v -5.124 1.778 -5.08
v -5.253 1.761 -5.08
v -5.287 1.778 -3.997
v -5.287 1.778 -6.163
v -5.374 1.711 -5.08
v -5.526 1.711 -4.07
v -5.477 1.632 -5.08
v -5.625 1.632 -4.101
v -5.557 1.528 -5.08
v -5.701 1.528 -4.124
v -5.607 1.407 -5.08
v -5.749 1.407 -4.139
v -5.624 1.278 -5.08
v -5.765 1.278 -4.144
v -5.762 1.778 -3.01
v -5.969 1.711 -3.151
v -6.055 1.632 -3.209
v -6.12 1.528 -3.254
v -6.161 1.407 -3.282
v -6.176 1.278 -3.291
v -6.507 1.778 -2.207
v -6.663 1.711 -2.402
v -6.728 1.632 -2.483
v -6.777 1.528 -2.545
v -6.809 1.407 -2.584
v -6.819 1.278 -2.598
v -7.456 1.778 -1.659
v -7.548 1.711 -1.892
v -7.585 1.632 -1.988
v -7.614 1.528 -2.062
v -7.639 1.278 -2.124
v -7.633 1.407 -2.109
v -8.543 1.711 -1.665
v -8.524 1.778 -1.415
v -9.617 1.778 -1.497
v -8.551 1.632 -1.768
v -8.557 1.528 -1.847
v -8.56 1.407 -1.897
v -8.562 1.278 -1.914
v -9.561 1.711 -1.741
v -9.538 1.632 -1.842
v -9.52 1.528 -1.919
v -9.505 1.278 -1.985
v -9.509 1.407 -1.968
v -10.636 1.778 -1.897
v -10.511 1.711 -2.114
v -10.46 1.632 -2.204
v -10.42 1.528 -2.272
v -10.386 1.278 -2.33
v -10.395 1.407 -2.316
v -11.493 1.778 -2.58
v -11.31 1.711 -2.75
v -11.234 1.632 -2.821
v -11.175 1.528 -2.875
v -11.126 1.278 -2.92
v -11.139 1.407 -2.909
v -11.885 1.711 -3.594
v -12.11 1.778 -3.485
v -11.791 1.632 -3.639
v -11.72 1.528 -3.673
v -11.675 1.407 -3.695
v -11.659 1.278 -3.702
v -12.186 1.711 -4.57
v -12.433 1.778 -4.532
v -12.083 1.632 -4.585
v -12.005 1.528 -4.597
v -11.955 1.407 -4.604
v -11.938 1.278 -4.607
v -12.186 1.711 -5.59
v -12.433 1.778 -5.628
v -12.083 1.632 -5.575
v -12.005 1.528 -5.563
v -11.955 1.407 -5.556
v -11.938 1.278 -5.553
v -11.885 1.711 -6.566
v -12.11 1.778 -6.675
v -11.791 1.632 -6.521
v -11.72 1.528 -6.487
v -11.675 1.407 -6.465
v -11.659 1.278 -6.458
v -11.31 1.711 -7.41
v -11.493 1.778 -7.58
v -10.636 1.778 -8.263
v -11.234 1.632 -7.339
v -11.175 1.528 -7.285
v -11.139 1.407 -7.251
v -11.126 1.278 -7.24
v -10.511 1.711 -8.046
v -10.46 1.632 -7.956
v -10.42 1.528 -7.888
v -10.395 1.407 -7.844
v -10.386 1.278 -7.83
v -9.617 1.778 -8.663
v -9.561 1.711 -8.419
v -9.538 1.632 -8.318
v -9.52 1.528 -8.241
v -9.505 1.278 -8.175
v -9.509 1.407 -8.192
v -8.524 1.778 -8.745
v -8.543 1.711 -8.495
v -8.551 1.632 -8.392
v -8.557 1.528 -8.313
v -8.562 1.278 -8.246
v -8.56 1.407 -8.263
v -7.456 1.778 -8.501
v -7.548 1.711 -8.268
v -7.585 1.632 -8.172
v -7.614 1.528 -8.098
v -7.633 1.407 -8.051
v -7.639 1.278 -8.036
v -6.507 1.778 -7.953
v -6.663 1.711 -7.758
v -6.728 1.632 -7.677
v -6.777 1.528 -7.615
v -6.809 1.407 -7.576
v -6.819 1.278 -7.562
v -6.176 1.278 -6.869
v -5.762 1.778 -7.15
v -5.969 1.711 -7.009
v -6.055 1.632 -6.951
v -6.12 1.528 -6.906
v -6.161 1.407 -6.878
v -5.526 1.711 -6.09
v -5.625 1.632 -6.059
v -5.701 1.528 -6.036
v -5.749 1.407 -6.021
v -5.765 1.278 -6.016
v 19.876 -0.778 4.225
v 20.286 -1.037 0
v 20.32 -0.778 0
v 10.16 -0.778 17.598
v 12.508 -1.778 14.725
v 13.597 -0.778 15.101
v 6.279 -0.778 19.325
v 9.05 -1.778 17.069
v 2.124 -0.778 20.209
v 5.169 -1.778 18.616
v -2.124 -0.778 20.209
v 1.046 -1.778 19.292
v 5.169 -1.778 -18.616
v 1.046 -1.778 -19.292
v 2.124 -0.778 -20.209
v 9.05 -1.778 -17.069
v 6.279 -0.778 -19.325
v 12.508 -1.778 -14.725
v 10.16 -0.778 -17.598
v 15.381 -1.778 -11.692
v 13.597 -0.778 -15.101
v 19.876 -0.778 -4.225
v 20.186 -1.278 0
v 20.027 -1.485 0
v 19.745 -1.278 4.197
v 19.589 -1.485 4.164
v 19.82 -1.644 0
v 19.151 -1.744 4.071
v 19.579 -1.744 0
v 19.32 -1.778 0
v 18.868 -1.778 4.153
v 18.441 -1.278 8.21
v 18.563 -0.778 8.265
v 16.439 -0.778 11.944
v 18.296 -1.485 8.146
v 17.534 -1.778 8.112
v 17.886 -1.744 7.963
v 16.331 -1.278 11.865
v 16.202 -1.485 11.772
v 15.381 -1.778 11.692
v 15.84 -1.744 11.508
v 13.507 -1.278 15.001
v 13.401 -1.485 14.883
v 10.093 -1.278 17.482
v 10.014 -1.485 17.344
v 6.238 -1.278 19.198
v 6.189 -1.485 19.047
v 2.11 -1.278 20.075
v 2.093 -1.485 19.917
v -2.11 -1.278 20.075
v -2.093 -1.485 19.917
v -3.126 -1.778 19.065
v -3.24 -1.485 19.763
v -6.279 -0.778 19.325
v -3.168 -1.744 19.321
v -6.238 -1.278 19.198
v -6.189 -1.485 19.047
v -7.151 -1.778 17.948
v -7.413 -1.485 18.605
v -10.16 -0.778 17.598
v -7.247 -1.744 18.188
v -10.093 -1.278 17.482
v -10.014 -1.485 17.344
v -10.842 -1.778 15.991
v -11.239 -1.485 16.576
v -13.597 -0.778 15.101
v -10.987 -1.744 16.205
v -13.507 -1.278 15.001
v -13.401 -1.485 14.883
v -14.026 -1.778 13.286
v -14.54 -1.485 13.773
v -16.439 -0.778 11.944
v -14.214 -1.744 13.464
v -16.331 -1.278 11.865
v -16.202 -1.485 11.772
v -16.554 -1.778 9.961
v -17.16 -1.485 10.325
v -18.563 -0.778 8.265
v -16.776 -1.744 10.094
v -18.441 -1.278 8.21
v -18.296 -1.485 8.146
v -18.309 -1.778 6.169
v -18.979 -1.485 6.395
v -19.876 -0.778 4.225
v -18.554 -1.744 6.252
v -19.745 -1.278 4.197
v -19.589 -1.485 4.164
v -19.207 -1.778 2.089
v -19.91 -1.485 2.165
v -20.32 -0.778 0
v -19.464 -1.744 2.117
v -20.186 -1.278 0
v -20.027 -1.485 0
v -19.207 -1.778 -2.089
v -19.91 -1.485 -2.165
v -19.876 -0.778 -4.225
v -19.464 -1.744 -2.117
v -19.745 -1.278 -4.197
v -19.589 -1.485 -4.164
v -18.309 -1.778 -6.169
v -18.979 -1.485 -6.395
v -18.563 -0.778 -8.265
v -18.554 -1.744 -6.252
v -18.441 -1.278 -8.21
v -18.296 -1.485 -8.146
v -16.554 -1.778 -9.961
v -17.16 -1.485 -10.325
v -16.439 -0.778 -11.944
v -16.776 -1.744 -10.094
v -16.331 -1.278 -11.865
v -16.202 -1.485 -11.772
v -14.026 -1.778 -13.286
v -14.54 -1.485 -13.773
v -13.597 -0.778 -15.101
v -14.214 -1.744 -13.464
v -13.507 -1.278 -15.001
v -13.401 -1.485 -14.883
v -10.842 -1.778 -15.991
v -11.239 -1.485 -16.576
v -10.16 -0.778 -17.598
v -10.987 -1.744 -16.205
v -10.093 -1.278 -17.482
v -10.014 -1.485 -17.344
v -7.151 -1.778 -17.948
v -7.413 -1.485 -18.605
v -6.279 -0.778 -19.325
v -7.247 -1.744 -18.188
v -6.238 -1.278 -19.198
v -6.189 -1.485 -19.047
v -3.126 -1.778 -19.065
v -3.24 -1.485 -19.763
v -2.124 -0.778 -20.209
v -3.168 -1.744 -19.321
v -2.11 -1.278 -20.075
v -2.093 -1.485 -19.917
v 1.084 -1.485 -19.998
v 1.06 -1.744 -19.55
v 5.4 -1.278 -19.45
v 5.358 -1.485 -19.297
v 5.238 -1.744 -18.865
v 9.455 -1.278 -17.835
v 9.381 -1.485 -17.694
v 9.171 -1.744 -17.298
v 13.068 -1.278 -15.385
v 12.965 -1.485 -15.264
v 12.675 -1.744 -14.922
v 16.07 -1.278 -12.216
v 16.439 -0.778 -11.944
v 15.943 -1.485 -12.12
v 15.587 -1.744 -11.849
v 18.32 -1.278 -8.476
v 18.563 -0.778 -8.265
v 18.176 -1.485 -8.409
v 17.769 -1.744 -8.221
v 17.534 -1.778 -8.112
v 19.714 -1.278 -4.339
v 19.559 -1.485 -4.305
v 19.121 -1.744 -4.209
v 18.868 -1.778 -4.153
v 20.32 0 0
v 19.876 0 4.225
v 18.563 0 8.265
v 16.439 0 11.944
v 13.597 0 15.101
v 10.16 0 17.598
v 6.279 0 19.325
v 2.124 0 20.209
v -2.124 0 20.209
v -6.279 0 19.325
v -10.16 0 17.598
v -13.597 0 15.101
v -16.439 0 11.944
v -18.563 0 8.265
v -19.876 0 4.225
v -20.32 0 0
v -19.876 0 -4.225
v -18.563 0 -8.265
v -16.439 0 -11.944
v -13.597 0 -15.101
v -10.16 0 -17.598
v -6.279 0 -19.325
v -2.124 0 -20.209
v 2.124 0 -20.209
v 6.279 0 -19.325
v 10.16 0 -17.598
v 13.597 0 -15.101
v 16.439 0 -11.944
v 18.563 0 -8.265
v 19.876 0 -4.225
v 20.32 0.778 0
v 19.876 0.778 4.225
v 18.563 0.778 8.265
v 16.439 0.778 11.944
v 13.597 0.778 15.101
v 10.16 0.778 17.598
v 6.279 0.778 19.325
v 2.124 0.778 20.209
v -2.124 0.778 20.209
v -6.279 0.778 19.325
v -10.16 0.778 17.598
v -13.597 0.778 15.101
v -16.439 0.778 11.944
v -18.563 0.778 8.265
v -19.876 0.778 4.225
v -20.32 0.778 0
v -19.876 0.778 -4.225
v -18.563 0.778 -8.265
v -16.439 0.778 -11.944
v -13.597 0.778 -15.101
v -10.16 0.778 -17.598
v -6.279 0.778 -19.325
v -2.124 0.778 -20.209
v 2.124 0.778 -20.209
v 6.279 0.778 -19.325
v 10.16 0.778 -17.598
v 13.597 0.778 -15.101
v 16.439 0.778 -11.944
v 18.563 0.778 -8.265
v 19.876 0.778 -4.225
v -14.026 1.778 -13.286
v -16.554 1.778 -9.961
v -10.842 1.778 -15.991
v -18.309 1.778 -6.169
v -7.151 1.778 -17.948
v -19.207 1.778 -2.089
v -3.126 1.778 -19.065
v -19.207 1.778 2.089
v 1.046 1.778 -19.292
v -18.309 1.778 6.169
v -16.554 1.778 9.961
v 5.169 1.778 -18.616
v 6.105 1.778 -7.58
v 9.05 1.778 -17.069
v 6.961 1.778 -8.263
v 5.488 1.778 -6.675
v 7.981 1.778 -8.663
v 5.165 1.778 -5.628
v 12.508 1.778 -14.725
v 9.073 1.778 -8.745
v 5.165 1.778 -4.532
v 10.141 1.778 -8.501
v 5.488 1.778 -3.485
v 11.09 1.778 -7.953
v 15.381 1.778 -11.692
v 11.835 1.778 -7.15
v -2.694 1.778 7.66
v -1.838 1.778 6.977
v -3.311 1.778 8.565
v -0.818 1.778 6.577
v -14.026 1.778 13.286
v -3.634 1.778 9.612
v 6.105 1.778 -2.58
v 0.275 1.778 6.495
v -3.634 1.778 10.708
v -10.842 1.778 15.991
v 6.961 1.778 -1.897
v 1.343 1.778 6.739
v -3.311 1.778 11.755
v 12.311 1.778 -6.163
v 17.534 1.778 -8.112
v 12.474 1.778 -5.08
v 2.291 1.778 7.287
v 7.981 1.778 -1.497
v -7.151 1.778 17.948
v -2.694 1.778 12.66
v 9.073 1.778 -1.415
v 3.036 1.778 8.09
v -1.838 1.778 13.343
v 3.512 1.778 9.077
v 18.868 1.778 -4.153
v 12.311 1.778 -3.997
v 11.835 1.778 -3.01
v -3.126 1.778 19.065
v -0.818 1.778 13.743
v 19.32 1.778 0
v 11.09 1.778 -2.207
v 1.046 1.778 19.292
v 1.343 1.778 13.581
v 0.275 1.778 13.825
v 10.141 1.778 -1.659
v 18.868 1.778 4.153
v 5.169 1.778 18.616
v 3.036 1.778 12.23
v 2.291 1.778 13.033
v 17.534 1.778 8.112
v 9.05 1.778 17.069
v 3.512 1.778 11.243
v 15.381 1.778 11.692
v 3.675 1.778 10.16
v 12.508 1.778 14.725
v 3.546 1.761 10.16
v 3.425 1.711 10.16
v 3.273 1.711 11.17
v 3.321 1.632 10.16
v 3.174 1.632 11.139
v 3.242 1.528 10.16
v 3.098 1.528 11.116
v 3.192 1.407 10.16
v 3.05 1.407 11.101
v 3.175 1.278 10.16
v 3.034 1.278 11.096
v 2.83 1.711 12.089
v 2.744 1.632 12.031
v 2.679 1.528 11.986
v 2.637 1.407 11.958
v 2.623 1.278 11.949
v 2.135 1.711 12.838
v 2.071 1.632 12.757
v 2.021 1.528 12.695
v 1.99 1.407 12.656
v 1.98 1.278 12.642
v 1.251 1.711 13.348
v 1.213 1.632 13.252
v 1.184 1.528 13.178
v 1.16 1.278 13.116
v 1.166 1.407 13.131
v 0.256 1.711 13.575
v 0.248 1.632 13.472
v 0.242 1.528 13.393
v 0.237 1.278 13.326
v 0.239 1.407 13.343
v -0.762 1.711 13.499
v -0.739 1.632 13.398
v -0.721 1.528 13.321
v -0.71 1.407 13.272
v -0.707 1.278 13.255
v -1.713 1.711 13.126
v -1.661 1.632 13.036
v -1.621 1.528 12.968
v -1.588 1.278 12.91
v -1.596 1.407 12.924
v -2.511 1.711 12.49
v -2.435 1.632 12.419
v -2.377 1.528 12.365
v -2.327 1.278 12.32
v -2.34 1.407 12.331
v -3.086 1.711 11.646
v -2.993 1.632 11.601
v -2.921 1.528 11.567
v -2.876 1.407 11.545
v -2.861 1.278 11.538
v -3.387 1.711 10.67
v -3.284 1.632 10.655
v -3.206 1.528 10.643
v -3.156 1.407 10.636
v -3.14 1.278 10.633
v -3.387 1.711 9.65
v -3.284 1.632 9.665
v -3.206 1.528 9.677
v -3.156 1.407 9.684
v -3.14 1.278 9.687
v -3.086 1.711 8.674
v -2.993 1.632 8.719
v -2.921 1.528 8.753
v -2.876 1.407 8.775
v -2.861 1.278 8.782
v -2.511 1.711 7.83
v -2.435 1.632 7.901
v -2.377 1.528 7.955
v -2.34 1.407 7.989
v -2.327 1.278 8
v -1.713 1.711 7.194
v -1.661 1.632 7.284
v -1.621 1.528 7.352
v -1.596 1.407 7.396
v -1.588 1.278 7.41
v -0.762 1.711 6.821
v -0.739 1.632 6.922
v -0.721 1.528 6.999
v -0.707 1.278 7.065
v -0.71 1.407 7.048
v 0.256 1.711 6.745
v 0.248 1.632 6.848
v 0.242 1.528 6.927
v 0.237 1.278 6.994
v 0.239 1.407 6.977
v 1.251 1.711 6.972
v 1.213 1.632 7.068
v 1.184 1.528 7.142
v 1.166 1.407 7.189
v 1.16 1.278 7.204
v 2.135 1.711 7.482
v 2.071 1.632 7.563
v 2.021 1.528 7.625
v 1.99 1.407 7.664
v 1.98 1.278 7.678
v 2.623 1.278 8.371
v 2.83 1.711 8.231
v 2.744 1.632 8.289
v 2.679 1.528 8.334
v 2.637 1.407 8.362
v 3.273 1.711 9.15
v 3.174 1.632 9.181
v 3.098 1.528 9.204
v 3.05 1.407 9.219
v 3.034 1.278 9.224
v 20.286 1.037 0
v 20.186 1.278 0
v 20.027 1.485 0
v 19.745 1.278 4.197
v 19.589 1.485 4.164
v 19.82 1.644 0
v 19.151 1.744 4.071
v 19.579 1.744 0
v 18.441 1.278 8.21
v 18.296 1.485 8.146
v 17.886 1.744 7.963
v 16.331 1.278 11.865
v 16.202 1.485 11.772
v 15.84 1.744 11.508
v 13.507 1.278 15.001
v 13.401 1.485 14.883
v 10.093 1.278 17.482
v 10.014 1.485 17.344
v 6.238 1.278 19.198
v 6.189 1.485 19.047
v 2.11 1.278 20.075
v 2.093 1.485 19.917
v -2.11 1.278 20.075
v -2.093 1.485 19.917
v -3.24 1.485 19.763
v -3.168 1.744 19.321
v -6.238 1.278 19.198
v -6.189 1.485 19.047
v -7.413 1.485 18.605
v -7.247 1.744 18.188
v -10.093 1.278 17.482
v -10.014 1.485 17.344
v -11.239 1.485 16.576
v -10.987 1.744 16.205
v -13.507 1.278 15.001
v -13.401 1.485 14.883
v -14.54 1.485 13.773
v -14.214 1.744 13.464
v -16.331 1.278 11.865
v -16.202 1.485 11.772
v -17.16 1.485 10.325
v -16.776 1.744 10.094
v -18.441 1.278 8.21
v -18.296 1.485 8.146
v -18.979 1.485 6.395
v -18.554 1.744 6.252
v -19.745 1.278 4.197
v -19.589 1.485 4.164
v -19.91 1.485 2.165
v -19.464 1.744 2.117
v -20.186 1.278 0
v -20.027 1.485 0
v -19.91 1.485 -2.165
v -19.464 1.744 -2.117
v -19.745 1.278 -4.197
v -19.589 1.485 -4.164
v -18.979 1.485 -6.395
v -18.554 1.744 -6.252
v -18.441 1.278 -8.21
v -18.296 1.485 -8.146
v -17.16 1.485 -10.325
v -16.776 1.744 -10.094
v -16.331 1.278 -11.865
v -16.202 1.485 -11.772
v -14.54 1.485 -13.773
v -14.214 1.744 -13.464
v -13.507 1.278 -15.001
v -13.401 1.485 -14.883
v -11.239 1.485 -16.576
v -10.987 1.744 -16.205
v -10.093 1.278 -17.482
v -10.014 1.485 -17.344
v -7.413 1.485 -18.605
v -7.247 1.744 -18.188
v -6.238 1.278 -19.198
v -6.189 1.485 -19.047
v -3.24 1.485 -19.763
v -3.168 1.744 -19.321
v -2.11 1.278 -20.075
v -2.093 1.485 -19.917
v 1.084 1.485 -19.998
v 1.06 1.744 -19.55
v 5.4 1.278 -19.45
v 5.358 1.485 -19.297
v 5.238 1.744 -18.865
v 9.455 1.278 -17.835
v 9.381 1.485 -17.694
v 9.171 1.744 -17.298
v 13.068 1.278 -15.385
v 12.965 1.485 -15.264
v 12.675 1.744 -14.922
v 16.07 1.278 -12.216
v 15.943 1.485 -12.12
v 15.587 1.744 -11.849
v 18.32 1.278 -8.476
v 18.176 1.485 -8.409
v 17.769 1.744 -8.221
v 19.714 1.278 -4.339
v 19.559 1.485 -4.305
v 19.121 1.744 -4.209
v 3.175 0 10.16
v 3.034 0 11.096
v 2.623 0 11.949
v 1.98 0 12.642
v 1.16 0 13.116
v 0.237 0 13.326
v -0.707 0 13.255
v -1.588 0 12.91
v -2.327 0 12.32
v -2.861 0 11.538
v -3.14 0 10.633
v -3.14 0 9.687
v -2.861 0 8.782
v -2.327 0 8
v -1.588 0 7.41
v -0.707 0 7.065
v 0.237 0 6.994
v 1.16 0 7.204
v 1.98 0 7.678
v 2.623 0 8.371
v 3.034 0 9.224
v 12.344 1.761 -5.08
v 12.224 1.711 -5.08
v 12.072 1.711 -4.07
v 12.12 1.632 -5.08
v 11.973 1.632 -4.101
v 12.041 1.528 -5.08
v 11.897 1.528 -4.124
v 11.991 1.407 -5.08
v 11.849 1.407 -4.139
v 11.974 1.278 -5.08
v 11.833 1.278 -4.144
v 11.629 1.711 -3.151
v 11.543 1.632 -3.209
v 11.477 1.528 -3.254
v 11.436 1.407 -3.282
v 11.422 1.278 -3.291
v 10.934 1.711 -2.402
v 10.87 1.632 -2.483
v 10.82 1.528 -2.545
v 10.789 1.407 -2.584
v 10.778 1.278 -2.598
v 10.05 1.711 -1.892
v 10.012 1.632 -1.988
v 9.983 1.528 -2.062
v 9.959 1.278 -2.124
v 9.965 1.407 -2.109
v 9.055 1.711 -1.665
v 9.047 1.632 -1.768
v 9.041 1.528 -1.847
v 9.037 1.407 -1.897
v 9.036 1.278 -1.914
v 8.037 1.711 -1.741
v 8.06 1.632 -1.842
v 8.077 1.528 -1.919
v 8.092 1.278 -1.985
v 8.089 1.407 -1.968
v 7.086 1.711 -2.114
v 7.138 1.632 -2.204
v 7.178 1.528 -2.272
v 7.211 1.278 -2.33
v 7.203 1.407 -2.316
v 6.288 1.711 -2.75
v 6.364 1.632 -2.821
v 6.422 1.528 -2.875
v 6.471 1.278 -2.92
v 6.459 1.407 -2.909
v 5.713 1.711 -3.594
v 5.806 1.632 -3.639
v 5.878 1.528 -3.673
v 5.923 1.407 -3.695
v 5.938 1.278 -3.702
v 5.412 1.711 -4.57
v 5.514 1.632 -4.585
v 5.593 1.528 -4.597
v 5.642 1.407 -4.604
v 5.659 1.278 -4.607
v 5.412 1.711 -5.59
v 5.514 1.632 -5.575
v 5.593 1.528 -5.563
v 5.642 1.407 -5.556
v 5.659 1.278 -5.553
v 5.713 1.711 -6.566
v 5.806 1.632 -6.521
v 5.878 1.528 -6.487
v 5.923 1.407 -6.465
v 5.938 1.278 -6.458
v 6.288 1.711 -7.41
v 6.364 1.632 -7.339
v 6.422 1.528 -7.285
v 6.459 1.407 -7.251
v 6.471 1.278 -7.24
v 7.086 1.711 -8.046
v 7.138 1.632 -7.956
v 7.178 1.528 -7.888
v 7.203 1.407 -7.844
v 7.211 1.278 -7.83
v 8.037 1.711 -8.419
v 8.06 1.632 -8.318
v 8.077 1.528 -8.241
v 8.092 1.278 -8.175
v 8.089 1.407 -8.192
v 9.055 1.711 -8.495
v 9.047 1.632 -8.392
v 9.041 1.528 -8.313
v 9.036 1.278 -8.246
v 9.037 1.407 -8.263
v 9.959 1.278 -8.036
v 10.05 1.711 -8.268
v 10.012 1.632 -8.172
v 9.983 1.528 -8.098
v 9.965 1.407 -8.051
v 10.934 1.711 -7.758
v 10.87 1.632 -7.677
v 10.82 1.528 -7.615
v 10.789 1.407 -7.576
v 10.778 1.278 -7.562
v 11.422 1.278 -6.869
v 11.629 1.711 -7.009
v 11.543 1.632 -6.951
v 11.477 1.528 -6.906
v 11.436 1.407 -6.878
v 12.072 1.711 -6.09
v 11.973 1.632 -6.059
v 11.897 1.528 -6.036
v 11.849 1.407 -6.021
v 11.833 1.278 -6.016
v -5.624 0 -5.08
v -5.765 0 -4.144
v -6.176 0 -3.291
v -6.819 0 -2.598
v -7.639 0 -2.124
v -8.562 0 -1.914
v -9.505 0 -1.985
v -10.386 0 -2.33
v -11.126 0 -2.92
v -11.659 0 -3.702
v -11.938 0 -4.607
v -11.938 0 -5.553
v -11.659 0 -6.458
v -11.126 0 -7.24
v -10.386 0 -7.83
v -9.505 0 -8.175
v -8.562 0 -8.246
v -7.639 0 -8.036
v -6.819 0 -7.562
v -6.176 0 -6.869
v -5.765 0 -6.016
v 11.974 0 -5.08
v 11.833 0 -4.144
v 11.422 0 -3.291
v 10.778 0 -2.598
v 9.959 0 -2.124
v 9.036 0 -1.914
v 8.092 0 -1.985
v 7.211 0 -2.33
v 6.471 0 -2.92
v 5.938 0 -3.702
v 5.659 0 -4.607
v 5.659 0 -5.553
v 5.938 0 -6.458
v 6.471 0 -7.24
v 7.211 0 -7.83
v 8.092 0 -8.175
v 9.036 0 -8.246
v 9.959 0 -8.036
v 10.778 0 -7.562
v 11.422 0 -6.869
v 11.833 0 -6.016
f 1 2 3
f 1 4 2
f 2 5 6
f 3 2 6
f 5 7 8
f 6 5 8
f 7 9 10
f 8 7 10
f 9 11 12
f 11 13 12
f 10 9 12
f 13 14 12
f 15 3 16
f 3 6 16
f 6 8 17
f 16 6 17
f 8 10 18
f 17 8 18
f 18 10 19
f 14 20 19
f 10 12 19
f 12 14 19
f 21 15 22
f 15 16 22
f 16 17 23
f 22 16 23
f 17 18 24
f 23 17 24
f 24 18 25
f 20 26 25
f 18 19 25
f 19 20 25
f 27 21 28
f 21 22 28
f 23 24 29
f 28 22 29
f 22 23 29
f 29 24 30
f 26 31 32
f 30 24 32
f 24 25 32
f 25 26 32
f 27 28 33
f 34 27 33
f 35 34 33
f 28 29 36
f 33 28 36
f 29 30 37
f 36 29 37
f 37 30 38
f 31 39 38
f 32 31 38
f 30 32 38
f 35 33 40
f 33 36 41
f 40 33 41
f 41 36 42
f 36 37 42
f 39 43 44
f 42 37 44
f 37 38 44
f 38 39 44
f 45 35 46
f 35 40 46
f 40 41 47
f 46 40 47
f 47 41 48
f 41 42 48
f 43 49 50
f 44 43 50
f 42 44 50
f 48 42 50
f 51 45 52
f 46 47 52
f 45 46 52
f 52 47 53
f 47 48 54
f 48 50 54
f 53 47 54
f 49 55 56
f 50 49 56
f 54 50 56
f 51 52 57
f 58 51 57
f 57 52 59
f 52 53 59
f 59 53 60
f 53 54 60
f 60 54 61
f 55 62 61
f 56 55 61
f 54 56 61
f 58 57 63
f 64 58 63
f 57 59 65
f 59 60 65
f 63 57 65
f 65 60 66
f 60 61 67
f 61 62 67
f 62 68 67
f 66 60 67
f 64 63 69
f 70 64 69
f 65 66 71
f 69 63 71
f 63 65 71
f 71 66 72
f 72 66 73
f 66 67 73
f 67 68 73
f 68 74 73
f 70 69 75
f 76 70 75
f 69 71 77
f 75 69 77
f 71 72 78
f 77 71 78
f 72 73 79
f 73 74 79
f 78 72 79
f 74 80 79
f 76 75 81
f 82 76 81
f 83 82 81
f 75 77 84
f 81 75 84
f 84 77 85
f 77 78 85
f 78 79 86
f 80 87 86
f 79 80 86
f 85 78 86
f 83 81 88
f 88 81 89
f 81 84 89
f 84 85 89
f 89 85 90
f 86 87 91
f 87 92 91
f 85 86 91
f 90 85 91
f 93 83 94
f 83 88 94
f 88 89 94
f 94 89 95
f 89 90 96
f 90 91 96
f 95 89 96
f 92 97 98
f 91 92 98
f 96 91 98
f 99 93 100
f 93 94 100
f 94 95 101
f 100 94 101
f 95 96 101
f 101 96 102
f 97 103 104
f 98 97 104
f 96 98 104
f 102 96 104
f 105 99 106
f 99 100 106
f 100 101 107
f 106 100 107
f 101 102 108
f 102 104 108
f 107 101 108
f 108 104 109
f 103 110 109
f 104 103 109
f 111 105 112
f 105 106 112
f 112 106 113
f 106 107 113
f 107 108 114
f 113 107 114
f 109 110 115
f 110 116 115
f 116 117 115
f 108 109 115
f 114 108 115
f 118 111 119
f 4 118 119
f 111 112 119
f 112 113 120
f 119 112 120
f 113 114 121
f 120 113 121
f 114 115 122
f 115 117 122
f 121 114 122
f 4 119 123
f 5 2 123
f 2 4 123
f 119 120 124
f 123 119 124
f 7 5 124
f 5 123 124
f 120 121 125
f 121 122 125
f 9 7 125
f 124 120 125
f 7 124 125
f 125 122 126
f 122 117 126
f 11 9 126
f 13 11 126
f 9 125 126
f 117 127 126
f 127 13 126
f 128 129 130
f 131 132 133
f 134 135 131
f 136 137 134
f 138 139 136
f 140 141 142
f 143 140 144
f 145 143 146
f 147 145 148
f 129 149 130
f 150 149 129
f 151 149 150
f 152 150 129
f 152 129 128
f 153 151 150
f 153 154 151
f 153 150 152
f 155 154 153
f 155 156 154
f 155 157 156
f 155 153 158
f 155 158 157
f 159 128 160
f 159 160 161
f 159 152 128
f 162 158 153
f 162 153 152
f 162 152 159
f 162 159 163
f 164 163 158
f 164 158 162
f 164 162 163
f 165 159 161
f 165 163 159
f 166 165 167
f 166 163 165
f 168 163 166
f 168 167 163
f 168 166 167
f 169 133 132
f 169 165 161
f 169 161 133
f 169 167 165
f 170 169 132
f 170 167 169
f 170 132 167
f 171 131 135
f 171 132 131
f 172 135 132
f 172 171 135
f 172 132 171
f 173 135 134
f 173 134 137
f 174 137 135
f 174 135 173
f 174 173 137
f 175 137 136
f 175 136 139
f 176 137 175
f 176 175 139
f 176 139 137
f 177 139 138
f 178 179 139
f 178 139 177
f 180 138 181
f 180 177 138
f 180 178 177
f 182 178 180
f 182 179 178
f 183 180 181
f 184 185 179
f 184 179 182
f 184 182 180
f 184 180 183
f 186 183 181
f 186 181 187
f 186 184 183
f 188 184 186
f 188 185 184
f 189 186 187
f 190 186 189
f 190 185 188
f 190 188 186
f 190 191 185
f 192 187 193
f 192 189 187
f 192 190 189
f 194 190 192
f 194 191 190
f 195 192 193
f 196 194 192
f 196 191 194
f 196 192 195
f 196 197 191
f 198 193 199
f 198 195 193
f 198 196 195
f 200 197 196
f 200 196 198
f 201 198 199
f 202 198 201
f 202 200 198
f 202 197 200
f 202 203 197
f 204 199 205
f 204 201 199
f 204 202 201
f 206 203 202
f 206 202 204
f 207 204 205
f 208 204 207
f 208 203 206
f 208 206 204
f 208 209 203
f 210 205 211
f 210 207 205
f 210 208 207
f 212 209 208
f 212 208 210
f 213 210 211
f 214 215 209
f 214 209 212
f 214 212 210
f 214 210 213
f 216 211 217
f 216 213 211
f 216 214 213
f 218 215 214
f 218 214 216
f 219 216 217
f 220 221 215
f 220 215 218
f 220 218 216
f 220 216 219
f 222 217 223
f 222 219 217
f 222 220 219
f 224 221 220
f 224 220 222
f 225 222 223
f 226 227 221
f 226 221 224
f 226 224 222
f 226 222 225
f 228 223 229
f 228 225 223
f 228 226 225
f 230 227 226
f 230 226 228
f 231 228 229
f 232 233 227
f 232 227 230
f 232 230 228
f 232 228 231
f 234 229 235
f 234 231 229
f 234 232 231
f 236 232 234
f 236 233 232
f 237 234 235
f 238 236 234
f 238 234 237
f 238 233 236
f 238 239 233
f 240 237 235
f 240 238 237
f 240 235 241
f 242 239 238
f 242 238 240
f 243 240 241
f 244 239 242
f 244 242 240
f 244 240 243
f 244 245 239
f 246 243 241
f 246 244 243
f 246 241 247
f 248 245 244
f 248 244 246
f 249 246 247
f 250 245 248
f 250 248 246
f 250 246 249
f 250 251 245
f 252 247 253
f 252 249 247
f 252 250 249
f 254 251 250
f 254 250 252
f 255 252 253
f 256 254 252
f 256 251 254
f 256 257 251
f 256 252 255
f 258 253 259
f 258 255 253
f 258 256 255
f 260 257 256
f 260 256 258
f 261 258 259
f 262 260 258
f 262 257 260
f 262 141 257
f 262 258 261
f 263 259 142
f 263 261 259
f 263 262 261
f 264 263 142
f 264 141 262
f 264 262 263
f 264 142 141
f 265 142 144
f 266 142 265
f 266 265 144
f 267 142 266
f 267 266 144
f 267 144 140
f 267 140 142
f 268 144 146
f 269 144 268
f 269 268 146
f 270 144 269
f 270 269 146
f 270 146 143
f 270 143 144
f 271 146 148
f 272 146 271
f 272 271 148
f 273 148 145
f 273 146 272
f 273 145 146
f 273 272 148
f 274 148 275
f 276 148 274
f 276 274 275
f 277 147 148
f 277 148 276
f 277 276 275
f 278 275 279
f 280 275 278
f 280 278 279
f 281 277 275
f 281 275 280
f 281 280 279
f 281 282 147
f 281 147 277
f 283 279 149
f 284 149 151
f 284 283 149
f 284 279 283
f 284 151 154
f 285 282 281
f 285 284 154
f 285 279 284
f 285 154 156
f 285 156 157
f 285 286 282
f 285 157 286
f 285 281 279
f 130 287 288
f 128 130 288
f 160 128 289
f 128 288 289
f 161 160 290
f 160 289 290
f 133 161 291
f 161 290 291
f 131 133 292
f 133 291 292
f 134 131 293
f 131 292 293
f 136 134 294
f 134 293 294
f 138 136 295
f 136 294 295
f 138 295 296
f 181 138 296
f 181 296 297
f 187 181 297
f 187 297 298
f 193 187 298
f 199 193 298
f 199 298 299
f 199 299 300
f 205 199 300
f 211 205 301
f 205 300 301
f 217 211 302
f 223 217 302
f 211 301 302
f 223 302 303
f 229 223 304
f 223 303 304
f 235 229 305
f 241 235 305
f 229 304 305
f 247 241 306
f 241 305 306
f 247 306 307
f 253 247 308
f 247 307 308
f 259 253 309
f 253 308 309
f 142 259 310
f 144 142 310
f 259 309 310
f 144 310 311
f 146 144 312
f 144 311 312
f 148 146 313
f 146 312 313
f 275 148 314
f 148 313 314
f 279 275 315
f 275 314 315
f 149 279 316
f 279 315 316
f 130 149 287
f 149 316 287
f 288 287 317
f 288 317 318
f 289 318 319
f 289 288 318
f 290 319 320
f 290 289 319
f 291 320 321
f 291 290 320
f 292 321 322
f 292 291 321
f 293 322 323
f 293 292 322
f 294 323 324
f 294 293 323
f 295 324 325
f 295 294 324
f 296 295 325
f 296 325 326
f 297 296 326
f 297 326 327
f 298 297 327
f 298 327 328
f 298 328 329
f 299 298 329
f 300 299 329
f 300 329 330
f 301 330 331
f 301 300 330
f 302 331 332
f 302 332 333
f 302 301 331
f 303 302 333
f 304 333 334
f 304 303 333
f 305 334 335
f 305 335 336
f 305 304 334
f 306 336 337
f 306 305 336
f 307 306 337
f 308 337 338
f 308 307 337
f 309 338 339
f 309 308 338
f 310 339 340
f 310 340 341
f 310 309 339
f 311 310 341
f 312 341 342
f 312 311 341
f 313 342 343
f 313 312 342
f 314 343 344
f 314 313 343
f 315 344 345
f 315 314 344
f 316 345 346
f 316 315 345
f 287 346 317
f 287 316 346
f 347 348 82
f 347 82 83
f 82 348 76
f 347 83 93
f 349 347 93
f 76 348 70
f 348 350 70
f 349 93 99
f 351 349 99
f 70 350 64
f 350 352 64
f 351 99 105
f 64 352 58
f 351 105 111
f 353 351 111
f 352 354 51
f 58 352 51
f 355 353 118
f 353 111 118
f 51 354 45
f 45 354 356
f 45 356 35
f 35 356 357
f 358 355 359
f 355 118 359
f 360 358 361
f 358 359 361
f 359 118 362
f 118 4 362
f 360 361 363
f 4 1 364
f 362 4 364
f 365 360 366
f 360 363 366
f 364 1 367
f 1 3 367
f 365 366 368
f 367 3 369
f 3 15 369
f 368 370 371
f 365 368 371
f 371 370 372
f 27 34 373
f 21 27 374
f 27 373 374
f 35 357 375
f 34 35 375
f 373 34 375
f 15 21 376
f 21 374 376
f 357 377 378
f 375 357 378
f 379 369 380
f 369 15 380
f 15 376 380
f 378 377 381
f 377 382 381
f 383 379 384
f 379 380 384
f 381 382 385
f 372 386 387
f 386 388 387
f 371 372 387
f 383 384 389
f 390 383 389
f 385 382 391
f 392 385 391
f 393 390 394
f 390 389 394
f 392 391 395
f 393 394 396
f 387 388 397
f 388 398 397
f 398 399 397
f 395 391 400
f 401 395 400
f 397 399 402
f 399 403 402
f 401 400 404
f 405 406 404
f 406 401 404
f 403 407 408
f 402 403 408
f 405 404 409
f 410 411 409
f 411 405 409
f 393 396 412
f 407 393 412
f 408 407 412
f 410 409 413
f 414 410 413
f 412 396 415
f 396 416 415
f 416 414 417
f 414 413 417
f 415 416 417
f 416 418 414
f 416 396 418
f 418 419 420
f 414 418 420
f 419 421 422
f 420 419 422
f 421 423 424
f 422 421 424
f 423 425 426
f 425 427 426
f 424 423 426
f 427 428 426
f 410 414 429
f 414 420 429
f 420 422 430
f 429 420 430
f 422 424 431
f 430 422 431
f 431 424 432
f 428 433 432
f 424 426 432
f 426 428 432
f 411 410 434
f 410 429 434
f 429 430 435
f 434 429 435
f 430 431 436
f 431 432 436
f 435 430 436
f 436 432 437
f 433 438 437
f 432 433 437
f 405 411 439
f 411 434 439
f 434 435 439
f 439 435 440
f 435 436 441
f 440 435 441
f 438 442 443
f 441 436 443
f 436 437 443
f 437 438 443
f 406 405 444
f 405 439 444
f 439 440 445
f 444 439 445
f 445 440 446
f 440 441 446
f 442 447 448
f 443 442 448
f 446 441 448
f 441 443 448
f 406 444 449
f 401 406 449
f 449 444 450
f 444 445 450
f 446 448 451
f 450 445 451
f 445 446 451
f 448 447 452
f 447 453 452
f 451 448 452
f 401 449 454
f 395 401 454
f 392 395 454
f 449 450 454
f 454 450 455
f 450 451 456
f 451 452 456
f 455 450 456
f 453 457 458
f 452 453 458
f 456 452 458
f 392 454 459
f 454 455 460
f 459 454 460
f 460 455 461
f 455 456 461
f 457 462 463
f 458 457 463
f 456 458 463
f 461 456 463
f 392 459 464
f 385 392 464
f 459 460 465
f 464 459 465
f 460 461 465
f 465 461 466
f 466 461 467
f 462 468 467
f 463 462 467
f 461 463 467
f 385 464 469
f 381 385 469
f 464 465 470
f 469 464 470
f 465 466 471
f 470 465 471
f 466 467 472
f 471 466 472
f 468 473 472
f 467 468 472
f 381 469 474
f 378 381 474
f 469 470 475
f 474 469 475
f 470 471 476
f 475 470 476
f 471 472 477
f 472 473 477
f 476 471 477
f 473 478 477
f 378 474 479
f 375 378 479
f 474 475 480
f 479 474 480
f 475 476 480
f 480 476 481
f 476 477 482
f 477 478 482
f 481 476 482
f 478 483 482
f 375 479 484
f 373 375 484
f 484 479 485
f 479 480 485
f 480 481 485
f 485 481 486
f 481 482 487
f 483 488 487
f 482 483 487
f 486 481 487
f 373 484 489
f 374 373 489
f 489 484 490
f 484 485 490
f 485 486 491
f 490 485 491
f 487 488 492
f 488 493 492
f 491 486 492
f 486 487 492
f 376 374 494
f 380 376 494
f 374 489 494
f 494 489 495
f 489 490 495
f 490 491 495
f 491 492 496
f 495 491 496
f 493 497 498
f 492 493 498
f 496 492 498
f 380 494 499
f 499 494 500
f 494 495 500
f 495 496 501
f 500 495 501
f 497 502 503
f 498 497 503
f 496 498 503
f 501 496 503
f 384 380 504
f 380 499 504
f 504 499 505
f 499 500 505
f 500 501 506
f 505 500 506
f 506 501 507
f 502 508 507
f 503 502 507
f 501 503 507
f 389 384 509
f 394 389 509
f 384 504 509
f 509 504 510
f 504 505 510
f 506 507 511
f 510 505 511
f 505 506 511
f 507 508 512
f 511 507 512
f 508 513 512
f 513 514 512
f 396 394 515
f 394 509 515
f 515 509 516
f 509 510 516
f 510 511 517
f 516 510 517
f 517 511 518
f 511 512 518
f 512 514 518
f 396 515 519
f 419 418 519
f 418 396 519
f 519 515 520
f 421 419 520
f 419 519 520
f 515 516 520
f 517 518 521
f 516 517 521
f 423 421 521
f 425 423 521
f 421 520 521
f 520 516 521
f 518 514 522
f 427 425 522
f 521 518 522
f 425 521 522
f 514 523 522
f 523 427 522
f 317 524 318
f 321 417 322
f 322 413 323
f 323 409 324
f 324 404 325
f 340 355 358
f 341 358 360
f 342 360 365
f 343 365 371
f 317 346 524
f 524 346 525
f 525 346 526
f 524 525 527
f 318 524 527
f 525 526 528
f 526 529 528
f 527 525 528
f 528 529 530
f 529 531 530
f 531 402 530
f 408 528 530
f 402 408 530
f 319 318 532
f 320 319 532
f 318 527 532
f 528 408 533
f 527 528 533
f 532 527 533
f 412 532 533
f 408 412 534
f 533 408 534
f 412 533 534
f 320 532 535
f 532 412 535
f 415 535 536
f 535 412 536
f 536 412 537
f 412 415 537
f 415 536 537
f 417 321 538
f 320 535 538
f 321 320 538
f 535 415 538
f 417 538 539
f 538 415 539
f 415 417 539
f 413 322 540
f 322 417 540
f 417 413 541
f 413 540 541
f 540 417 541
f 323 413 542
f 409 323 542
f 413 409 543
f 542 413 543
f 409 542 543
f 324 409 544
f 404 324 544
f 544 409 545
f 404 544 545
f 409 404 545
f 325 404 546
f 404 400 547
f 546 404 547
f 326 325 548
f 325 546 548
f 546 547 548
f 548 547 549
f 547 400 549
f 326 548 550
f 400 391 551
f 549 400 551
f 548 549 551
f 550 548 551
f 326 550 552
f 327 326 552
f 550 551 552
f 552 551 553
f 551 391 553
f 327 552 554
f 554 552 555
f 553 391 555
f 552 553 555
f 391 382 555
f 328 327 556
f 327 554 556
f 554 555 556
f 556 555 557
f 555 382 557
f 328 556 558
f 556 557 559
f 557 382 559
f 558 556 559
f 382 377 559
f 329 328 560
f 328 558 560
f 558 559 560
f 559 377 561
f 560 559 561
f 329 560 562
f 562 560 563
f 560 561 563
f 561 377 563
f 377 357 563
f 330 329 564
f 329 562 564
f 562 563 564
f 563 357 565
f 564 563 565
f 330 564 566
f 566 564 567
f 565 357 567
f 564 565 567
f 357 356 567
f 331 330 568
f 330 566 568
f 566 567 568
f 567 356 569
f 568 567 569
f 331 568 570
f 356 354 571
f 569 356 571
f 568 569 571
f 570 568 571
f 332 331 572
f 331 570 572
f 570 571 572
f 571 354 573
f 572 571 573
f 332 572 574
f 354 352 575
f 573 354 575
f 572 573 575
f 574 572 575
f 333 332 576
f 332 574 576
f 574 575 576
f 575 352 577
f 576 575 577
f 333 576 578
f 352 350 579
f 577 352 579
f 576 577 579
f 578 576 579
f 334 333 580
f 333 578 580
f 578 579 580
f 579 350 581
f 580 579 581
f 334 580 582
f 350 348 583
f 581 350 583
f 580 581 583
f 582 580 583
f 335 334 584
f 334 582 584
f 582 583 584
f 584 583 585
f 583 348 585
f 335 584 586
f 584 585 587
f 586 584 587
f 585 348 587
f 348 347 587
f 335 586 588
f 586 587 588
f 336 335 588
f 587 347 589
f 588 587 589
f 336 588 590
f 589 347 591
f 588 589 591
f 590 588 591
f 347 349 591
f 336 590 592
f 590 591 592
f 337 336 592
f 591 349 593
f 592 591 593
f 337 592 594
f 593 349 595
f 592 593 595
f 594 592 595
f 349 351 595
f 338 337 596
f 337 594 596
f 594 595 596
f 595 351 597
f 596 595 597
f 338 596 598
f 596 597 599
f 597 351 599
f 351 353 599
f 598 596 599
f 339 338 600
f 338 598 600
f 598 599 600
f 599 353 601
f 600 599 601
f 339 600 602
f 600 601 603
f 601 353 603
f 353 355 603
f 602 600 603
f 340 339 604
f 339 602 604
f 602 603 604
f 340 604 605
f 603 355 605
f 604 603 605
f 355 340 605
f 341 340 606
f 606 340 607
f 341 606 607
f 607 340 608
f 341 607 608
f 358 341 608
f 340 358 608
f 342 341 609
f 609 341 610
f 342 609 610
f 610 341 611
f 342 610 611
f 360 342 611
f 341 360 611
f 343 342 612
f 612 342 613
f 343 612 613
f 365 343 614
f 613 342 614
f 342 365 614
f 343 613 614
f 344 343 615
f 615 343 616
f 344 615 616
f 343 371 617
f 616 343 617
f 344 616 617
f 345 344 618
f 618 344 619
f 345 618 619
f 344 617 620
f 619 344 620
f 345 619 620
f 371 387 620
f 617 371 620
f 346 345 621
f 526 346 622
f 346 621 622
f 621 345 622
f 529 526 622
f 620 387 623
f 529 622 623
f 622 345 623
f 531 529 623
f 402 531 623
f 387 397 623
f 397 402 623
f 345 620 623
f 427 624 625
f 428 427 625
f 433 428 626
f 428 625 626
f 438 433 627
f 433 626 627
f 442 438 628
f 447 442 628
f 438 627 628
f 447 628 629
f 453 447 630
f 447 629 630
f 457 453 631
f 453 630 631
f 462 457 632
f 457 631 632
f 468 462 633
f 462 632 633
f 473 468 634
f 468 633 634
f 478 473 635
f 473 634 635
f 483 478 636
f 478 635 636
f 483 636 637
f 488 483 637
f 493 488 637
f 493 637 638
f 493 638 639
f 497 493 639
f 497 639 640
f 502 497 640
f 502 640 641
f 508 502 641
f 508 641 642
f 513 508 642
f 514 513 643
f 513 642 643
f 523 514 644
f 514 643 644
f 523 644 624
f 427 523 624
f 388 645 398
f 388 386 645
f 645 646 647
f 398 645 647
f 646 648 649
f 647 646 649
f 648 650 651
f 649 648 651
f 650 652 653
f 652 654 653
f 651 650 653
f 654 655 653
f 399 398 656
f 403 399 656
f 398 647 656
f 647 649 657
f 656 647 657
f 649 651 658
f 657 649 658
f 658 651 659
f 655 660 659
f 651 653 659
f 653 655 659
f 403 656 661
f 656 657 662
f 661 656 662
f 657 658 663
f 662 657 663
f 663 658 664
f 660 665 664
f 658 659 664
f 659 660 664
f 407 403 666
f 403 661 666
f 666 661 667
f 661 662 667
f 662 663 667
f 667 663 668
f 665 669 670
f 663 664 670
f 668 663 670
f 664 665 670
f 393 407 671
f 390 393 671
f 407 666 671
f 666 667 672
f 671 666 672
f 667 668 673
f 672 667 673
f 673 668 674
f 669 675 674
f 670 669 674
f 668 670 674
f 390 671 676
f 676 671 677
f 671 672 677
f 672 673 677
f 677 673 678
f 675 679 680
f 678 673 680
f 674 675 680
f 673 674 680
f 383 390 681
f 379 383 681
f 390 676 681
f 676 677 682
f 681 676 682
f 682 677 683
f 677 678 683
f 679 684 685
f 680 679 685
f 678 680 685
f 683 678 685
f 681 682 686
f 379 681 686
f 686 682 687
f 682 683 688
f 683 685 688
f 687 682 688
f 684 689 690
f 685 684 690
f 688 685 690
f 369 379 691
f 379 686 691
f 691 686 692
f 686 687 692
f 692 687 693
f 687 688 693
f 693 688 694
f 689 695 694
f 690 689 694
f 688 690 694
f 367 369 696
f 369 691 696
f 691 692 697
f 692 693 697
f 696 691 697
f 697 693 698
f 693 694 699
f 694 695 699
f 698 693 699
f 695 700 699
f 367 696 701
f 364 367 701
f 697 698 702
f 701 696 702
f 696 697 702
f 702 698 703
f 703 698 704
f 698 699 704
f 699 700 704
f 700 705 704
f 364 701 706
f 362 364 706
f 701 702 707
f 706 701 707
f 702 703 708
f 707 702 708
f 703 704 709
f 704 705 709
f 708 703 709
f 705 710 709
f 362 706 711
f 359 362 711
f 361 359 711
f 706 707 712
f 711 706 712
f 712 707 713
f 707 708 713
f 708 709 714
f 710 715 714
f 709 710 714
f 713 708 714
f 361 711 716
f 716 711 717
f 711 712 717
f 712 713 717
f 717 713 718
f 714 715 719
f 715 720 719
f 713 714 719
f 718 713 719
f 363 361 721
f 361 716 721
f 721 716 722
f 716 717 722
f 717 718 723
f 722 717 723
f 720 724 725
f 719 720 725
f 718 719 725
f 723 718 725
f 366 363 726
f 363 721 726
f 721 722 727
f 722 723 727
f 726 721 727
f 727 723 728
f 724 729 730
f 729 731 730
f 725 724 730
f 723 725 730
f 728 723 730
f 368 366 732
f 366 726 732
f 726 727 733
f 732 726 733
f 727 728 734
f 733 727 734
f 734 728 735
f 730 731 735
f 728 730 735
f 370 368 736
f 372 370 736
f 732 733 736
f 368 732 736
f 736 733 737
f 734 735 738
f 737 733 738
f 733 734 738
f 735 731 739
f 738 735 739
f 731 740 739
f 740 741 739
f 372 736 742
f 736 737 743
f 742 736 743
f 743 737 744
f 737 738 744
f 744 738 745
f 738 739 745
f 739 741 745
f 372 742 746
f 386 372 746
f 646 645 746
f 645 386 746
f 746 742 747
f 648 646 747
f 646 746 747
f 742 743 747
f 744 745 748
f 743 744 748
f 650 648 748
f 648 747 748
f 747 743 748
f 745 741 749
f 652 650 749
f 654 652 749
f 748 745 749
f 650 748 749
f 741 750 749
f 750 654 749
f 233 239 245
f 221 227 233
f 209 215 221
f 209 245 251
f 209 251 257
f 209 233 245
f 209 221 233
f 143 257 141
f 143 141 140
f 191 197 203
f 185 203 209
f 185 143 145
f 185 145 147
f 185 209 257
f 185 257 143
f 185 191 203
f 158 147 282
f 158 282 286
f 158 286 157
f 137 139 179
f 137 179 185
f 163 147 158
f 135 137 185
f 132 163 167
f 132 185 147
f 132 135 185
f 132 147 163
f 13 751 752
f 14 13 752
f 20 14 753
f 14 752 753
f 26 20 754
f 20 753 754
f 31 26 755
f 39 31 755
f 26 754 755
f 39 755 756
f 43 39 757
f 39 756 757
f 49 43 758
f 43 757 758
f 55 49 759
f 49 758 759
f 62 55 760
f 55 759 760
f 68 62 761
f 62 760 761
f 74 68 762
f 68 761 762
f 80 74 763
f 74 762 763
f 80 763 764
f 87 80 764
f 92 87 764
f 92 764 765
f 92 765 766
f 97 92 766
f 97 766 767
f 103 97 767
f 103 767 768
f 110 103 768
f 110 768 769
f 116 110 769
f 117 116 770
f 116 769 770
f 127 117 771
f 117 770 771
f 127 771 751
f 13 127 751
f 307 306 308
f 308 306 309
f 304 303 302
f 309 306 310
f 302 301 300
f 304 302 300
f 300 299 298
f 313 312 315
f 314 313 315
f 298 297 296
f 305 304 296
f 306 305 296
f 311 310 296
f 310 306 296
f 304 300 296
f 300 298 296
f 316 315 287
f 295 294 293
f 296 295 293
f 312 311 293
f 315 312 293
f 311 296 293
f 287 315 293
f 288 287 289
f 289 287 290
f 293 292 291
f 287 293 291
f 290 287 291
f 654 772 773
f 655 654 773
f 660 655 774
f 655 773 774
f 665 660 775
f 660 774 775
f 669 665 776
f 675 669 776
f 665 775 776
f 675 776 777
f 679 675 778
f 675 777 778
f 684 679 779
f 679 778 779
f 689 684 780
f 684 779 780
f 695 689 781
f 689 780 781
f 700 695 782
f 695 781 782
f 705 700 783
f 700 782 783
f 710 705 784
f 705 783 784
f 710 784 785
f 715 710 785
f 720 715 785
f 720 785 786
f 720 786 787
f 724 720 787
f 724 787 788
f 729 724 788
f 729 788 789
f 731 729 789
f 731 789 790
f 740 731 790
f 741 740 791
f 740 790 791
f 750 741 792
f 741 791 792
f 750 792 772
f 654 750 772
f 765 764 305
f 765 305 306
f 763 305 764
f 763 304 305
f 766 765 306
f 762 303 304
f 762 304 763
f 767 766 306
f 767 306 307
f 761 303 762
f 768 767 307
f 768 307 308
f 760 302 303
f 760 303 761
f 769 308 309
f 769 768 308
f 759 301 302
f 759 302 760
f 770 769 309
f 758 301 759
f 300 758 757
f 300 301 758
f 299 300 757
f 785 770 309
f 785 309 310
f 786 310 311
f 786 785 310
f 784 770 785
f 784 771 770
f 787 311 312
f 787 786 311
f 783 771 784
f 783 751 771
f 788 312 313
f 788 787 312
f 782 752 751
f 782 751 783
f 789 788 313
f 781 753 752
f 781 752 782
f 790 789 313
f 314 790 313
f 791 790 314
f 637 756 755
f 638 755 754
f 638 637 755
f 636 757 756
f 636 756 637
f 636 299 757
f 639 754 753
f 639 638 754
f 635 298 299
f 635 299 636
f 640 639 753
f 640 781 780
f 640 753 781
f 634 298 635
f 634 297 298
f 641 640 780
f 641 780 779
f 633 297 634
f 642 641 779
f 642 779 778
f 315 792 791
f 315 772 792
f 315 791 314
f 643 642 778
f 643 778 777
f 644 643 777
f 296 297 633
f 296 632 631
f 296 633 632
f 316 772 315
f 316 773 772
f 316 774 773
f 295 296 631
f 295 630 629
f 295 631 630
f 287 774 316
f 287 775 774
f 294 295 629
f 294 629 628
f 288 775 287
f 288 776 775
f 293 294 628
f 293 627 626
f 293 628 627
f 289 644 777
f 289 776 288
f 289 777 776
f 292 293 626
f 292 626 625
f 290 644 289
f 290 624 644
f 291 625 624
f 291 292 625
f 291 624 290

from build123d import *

# Parameters (mm, degrees)
F0_R     = 20.32
F0_R_2   = 17.78
F0_R_3   = 3.175
F1_DEPTH = 1.778
F2_DEPTH = 1.778
F3_R     = 1
F3_2_R   = 1
F4_R     = 0.5


with BuildPart() as f1:
    # F0 (on Front) → F1 (new body)
    with BuildSketch(Plane.XZ):
        Circle(F0_R)
        Circle(F0_R_2, mode=Mode.SUBTRACT)
        Circle(F0_R_2)
        with Locations((-8.7988181024, -5.08)):
            Circle(F0_R_3, mode=Mode.SUBTRACT)
        with Locations((8.7988181024, -5.08)):
            Circle(F0_R_3, mode=Mode.SUBTRACT)
        with Locations((0, 10.16)):
            Circle(F0_R_3, mode=Mode.SUBTRACT)
        with Locations((-8.7988181024, -5.08)):
            Circle(F0_R_3)
        with Locations((8.7988181024, -5.08)):
            Circle(F0_R_3)
        with Locations((0, 10.16)):
            Circle(F0_R_3)
    extrude(amount=F1_DEPTH)

    # F3
    f3_edges = [f1.edges().sort_by_distance(p)[0] for p in [
        (-20.32, -1.778, 0),
    ]]
    fillet(f3_edges, radius=F3_R)


with BuildPart() as f2:
    # F0 (on Front) → F2 (new body)
    with BuildSketch(Plane.XZ):
        Circle(F0_R)
        Circle(F0_R_2, mode=Mode.SUBTRACT)
        Circle(F0_R_2)
        with Locations((-8.7988181024, -5.08)):
            Circle(F0_R_3, mode=Mode.SUBTRACT)
        with Locations((8.7988181024, -5.08)):
            Circle(F0_R_3, mode=Mode.SUBTRACT)
        with Locations((0, 10.16)):
            Circle(F0_R_3, mode=Mode.SUBTRACT)
    extrude(amount=-F2_DEPTH)

    # F3#2
    f3_2_edges = [f2.edges().sort_by_distance(p)[0] for p in [
        (-20.32, 1.778, 0),
    ]]
    fillet(f3_2_edges, radius=F3_2_R)

    # F4
    f4_edges = [f2.edges().sort_by_distance(p)[0] for p in [
        (5.623818, 1.778, -5.08),
        (-11.973818, 1.778, -5.08),
        (-3.175, 1.778, 10.16),
    ]]
    fillet(f4_edges, radius=F4_R)


solid = Compound([f1.part, f2.part])
